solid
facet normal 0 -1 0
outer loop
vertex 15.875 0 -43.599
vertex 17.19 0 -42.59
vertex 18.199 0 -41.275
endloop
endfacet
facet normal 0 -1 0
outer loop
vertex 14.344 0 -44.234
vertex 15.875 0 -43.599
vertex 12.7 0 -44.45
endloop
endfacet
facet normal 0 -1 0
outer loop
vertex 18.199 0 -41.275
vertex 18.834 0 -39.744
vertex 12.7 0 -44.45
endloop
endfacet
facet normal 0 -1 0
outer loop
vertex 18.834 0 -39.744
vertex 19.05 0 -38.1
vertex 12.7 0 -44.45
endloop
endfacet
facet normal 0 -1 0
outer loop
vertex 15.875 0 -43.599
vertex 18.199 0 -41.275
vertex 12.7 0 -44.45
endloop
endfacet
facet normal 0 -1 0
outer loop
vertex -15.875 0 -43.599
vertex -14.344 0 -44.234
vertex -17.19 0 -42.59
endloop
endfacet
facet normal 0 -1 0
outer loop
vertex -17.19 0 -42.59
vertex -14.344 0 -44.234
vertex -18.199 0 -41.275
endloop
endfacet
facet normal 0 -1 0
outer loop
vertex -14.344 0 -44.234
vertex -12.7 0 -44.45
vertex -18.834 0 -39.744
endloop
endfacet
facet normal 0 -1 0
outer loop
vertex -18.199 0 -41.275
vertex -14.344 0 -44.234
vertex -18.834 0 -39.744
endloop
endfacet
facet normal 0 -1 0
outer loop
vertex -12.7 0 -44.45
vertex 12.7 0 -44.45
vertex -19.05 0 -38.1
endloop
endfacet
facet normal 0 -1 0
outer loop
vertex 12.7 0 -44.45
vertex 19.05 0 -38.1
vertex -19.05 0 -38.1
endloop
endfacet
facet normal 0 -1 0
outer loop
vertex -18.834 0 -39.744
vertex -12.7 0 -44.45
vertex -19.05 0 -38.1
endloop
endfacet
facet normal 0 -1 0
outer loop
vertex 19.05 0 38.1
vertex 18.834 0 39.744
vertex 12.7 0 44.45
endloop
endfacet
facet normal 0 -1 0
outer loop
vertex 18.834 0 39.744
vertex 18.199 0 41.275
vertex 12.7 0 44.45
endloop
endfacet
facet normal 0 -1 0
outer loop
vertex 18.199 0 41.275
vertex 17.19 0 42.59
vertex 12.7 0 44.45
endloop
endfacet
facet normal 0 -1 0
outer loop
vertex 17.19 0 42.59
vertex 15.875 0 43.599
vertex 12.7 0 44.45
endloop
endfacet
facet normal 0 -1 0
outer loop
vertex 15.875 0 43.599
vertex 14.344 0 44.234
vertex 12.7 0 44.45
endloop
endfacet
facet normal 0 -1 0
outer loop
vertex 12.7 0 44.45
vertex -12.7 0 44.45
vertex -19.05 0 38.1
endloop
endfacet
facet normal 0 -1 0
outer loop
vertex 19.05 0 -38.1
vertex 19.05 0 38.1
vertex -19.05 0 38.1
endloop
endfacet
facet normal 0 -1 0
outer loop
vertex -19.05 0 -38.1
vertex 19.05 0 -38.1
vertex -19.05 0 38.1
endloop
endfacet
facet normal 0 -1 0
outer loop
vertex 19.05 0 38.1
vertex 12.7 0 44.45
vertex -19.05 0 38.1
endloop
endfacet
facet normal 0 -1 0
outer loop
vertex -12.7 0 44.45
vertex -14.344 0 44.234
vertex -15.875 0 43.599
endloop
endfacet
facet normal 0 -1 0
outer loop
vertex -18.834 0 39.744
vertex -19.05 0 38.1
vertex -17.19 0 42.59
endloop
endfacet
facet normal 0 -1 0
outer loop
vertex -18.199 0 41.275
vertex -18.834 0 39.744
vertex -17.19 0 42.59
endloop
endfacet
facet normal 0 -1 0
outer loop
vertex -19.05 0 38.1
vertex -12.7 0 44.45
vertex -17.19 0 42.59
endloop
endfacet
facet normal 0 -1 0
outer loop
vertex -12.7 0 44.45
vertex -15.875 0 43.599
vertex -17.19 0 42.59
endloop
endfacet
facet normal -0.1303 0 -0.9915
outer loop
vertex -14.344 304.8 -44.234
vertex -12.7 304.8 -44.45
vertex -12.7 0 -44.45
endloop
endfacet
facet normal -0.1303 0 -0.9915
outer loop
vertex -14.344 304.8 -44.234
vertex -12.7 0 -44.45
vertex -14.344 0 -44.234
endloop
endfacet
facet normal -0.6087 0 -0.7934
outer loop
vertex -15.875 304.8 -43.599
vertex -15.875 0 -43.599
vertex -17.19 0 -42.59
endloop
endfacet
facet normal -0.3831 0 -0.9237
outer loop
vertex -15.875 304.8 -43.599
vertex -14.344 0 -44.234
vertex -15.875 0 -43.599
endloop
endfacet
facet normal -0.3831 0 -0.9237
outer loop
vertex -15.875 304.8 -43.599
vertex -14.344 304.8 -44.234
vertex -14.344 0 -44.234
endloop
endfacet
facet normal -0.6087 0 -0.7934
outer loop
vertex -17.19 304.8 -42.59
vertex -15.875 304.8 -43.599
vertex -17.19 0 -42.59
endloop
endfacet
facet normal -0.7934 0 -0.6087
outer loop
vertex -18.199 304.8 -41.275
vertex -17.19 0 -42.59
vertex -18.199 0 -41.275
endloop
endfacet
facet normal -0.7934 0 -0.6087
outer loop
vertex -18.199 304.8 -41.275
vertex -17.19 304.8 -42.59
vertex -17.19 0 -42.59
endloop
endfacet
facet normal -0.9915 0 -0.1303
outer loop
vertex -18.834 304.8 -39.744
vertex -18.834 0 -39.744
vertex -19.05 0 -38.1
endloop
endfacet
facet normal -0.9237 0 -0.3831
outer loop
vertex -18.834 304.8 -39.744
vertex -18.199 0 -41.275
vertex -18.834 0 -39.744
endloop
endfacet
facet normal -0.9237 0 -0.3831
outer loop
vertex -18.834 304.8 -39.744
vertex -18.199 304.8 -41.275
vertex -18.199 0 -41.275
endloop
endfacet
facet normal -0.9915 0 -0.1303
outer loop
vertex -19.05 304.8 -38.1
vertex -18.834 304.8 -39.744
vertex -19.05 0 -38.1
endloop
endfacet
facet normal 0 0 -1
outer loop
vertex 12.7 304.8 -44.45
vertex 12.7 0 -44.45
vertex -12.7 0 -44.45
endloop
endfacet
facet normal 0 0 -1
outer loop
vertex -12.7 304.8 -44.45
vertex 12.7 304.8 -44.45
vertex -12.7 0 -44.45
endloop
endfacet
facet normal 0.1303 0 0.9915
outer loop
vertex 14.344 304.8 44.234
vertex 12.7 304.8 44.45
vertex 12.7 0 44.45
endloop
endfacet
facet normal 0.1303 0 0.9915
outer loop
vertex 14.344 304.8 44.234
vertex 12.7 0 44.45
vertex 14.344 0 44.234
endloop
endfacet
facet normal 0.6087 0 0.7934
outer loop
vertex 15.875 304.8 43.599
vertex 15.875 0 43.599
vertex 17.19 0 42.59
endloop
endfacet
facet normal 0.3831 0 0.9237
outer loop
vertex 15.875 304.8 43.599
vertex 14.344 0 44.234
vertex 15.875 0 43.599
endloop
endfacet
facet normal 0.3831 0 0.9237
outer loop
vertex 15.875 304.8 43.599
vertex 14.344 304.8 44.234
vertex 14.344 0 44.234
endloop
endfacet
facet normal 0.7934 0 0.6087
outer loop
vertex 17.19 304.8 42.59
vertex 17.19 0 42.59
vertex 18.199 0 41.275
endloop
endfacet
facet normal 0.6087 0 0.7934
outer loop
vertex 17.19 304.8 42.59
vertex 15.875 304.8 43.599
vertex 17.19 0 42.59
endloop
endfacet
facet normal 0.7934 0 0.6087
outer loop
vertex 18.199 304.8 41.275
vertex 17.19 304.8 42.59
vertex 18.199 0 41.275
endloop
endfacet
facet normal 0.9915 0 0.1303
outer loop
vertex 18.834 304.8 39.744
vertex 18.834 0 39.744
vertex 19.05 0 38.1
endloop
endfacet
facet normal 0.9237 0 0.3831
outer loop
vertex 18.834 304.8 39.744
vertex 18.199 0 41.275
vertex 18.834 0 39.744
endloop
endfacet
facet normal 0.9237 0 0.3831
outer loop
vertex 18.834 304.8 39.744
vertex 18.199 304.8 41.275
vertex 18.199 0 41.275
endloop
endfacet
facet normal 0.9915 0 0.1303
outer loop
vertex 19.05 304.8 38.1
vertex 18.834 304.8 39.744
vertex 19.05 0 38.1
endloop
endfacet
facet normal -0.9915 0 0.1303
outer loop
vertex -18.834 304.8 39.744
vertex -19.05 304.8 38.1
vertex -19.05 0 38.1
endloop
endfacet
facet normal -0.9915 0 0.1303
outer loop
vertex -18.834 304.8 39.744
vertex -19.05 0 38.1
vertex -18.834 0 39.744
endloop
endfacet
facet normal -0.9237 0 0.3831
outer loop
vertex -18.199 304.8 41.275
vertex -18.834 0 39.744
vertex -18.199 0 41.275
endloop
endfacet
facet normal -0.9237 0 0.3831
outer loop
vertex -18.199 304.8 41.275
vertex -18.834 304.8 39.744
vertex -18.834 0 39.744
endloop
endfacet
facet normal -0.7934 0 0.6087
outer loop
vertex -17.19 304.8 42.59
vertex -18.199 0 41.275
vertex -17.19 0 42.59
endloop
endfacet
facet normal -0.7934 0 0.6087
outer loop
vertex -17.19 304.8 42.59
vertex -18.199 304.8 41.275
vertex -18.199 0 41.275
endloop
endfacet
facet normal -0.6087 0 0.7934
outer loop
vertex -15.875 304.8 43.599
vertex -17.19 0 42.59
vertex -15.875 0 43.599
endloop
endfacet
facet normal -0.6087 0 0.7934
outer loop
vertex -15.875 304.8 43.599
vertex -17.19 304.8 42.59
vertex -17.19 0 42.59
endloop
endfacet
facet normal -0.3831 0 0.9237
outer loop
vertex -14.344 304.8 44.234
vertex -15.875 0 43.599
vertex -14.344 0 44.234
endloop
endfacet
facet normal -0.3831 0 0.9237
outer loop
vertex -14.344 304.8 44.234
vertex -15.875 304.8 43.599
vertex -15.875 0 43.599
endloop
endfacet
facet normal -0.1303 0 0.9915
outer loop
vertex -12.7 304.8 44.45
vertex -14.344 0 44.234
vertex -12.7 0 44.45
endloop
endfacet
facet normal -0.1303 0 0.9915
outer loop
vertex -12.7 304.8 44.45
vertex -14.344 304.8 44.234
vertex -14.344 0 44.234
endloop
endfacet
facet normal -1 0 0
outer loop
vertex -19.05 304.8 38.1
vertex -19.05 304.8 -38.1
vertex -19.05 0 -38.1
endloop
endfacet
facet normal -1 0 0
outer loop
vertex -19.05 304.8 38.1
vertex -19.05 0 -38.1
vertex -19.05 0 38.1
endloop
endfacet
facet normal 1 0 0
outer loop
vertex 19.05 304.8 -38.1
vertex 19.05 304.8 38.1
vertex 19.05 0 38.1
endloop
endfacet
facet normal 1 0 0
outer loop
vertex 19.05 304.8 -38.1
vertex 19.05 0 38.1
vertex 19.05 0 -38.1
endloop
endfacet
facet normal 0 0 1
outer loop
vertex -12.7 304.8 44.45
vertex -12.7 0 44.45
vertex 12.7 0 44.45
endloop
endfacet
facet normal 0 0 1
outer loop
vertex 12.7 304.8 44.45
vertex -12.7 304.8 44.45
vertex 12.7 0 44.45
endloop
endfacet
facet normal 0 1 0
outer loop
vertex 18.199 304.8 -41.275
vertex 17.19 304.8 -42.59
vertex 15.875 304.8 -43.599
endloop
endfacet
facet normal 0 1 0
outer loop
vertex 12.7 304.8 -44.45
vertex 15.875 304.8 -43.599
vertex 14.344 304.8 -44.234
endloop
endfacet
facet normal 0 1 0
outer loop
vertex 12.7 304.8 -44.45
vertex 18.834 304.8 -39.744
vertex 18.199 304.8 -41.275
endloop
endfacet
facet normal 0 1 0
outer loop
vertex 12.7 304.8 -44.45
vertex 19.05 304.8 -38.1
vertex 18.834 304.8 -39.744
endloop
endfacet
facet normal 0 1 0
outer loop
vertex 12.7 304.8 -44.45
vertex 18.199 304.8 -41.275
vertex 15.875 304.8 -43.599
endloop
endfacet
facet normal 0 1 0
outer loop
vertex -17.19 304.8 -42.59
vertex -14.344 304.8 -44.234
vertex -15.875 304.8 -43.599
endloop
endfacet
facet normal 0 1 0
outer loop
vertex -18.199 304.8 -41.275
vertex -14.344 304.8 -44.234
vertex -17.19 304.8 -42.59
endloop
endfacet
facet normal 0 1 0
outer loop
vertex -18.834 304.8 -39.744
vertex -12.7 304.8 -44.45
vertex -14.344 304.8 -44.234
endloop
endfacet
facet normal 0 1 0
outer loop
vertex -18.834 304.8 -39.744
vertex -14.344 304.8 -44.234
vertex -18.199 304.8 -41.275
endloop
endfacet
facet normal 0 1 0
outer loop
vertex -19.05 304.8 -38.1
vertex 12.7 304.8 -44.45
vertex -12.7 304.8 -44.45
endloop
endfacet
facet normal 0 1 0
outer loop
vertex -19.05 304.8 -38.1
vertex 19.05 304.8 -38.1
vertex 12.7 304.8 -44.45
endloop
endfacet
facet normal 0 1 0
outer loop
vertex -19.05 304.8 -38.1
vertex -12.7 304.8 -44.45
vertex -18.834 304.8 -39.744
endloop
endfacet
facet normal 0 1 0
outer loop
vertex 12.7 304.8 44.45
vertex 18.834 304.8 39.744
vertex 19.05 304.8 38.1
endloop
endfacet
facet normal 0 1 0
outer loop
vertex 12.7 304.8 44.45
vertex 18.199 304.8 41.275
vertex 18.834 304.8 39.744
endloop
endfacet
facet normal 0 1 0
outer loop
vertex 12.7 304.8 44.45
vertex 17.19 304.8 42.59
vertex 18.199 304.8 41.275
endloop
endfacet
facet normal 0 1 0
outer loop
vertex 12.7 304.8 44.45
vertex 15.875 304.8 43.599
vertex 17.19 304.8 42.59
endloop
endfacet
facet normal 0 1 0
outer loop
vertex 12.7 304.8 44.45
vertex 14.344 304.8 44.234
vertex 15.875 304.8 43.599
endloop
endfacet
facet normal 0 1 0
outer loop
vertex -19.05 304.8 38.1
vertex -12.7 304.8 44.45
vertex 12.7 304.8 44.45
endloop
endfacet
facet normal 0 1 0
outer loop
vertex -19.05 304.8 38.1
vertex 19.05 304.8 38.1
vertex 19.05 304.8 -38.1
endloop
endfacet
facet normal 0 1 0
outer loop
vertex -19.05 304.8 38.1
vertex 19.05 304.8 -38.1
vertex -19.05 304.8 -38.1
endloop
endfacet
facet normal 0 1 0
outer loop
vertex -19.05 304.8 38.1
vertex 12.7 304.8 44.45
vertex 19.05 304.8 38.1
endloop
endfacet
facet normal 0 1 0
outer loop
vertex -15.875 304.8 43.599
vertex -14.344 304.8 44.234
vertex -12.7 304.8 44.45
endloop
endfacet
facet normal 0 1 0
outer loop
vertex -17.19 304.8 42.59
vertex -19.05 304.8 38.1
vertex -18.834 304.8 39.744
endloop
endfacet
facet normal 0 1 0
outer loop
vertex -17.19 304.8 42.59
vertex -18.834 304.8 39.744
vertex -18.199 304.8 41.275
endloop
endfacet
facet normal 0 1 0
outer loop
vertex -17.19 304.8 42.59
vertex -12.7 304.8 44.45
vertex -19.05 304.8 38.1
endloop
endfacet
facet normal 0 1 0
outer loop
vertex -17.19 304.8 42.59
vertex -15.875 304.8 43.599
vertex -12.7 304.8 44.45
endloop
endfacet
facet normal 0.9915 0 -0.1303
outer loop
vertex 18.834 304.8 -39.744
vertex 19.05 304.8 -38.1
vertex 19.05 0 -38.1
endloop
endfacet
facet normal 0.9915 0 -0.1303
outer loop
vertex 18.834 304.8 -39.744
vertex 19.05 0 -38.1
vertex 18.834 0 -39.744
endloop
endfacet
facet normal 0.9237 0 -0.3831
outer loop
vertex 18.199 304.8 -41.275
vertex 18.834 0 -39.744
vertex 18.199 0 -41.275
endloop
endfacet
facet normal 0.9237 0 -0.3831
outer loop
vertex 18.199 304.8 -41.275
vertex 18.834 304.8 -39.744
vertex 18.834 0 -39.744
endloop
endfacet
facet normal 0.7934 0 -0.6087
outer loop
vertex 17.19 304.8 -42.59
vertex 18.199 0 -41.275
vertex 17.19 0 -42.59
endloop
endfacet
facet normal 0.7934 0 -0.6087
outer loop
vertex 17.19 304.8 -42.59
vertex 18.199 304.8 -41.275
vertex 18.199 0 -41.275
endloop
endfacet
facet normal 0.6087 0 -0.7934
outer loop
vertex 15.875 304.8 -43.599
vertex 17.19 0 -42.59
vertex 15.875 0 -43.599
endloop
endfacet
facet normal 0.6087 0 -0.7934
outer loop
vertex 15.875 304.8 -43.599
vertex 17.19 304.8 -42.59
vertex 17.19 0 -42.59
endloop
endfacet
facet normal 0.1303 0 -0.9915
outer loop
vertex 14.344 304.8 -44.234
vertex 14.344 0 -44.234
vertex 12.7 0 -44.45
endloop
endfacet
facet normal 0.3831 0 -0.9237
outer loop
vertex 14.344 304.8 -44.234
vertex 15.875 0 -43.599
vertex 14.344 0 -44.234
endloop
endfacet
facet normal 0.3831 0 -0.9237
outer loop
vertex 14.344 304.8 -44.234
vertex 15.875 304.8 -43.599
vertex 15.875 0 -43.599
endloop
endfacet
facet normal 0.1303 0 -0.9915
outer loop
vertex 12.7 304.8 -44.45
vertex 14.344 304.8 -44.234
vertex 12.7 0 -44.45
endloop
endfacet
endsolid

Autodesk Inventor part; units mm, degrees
ref_plane "YZ Plane" through (0, 0, 0) normal (1, 0, 0) x (0, 1, 0)
ref_plane "XZ Plane" through (0, 0, 0) normal (0, 1, 0) x (-1, 0, 0)
ref_plane "XY Plane" through (0, 0, 0) normal (0, 0, 1) x (1, 0, 0)
sketch "Sketch1" plane through (0, 0, 0) normal (0, 1, 0) x (-1, 0, 0)
  line L0 (19.05, 44.45) -> (-19.05, 44.45)
  line L1 (-19.05, 44.45) -> (-19.05, -44.45)
  line L2 (-19.05, -44.45) -> (19.05, -44.45)
  line L3 (19.05, -44.45) -> (19.05, 44.45)
  line L4 (19.05, 44.45) -> (-19.05, -44.45) construction
  line L5 (-19.05, 44.45) -> (19.05, -44.45) construction
  point P0 (0, 0)
  dimension "d0" = 38.1
  dimension "d1" = 88.9
extrude "Extrusion1" add sketch "Sketch1" along normal blind 304.8
fillet "Fillet1" radius 6.35 4 edges at (19.05, 152.4, 44.45) (-19.05, 152.4, 44.45) (19.05, 152.4, -44.45) (-19.05, 152.4, -44.45)
properties part number "2by4mog"
